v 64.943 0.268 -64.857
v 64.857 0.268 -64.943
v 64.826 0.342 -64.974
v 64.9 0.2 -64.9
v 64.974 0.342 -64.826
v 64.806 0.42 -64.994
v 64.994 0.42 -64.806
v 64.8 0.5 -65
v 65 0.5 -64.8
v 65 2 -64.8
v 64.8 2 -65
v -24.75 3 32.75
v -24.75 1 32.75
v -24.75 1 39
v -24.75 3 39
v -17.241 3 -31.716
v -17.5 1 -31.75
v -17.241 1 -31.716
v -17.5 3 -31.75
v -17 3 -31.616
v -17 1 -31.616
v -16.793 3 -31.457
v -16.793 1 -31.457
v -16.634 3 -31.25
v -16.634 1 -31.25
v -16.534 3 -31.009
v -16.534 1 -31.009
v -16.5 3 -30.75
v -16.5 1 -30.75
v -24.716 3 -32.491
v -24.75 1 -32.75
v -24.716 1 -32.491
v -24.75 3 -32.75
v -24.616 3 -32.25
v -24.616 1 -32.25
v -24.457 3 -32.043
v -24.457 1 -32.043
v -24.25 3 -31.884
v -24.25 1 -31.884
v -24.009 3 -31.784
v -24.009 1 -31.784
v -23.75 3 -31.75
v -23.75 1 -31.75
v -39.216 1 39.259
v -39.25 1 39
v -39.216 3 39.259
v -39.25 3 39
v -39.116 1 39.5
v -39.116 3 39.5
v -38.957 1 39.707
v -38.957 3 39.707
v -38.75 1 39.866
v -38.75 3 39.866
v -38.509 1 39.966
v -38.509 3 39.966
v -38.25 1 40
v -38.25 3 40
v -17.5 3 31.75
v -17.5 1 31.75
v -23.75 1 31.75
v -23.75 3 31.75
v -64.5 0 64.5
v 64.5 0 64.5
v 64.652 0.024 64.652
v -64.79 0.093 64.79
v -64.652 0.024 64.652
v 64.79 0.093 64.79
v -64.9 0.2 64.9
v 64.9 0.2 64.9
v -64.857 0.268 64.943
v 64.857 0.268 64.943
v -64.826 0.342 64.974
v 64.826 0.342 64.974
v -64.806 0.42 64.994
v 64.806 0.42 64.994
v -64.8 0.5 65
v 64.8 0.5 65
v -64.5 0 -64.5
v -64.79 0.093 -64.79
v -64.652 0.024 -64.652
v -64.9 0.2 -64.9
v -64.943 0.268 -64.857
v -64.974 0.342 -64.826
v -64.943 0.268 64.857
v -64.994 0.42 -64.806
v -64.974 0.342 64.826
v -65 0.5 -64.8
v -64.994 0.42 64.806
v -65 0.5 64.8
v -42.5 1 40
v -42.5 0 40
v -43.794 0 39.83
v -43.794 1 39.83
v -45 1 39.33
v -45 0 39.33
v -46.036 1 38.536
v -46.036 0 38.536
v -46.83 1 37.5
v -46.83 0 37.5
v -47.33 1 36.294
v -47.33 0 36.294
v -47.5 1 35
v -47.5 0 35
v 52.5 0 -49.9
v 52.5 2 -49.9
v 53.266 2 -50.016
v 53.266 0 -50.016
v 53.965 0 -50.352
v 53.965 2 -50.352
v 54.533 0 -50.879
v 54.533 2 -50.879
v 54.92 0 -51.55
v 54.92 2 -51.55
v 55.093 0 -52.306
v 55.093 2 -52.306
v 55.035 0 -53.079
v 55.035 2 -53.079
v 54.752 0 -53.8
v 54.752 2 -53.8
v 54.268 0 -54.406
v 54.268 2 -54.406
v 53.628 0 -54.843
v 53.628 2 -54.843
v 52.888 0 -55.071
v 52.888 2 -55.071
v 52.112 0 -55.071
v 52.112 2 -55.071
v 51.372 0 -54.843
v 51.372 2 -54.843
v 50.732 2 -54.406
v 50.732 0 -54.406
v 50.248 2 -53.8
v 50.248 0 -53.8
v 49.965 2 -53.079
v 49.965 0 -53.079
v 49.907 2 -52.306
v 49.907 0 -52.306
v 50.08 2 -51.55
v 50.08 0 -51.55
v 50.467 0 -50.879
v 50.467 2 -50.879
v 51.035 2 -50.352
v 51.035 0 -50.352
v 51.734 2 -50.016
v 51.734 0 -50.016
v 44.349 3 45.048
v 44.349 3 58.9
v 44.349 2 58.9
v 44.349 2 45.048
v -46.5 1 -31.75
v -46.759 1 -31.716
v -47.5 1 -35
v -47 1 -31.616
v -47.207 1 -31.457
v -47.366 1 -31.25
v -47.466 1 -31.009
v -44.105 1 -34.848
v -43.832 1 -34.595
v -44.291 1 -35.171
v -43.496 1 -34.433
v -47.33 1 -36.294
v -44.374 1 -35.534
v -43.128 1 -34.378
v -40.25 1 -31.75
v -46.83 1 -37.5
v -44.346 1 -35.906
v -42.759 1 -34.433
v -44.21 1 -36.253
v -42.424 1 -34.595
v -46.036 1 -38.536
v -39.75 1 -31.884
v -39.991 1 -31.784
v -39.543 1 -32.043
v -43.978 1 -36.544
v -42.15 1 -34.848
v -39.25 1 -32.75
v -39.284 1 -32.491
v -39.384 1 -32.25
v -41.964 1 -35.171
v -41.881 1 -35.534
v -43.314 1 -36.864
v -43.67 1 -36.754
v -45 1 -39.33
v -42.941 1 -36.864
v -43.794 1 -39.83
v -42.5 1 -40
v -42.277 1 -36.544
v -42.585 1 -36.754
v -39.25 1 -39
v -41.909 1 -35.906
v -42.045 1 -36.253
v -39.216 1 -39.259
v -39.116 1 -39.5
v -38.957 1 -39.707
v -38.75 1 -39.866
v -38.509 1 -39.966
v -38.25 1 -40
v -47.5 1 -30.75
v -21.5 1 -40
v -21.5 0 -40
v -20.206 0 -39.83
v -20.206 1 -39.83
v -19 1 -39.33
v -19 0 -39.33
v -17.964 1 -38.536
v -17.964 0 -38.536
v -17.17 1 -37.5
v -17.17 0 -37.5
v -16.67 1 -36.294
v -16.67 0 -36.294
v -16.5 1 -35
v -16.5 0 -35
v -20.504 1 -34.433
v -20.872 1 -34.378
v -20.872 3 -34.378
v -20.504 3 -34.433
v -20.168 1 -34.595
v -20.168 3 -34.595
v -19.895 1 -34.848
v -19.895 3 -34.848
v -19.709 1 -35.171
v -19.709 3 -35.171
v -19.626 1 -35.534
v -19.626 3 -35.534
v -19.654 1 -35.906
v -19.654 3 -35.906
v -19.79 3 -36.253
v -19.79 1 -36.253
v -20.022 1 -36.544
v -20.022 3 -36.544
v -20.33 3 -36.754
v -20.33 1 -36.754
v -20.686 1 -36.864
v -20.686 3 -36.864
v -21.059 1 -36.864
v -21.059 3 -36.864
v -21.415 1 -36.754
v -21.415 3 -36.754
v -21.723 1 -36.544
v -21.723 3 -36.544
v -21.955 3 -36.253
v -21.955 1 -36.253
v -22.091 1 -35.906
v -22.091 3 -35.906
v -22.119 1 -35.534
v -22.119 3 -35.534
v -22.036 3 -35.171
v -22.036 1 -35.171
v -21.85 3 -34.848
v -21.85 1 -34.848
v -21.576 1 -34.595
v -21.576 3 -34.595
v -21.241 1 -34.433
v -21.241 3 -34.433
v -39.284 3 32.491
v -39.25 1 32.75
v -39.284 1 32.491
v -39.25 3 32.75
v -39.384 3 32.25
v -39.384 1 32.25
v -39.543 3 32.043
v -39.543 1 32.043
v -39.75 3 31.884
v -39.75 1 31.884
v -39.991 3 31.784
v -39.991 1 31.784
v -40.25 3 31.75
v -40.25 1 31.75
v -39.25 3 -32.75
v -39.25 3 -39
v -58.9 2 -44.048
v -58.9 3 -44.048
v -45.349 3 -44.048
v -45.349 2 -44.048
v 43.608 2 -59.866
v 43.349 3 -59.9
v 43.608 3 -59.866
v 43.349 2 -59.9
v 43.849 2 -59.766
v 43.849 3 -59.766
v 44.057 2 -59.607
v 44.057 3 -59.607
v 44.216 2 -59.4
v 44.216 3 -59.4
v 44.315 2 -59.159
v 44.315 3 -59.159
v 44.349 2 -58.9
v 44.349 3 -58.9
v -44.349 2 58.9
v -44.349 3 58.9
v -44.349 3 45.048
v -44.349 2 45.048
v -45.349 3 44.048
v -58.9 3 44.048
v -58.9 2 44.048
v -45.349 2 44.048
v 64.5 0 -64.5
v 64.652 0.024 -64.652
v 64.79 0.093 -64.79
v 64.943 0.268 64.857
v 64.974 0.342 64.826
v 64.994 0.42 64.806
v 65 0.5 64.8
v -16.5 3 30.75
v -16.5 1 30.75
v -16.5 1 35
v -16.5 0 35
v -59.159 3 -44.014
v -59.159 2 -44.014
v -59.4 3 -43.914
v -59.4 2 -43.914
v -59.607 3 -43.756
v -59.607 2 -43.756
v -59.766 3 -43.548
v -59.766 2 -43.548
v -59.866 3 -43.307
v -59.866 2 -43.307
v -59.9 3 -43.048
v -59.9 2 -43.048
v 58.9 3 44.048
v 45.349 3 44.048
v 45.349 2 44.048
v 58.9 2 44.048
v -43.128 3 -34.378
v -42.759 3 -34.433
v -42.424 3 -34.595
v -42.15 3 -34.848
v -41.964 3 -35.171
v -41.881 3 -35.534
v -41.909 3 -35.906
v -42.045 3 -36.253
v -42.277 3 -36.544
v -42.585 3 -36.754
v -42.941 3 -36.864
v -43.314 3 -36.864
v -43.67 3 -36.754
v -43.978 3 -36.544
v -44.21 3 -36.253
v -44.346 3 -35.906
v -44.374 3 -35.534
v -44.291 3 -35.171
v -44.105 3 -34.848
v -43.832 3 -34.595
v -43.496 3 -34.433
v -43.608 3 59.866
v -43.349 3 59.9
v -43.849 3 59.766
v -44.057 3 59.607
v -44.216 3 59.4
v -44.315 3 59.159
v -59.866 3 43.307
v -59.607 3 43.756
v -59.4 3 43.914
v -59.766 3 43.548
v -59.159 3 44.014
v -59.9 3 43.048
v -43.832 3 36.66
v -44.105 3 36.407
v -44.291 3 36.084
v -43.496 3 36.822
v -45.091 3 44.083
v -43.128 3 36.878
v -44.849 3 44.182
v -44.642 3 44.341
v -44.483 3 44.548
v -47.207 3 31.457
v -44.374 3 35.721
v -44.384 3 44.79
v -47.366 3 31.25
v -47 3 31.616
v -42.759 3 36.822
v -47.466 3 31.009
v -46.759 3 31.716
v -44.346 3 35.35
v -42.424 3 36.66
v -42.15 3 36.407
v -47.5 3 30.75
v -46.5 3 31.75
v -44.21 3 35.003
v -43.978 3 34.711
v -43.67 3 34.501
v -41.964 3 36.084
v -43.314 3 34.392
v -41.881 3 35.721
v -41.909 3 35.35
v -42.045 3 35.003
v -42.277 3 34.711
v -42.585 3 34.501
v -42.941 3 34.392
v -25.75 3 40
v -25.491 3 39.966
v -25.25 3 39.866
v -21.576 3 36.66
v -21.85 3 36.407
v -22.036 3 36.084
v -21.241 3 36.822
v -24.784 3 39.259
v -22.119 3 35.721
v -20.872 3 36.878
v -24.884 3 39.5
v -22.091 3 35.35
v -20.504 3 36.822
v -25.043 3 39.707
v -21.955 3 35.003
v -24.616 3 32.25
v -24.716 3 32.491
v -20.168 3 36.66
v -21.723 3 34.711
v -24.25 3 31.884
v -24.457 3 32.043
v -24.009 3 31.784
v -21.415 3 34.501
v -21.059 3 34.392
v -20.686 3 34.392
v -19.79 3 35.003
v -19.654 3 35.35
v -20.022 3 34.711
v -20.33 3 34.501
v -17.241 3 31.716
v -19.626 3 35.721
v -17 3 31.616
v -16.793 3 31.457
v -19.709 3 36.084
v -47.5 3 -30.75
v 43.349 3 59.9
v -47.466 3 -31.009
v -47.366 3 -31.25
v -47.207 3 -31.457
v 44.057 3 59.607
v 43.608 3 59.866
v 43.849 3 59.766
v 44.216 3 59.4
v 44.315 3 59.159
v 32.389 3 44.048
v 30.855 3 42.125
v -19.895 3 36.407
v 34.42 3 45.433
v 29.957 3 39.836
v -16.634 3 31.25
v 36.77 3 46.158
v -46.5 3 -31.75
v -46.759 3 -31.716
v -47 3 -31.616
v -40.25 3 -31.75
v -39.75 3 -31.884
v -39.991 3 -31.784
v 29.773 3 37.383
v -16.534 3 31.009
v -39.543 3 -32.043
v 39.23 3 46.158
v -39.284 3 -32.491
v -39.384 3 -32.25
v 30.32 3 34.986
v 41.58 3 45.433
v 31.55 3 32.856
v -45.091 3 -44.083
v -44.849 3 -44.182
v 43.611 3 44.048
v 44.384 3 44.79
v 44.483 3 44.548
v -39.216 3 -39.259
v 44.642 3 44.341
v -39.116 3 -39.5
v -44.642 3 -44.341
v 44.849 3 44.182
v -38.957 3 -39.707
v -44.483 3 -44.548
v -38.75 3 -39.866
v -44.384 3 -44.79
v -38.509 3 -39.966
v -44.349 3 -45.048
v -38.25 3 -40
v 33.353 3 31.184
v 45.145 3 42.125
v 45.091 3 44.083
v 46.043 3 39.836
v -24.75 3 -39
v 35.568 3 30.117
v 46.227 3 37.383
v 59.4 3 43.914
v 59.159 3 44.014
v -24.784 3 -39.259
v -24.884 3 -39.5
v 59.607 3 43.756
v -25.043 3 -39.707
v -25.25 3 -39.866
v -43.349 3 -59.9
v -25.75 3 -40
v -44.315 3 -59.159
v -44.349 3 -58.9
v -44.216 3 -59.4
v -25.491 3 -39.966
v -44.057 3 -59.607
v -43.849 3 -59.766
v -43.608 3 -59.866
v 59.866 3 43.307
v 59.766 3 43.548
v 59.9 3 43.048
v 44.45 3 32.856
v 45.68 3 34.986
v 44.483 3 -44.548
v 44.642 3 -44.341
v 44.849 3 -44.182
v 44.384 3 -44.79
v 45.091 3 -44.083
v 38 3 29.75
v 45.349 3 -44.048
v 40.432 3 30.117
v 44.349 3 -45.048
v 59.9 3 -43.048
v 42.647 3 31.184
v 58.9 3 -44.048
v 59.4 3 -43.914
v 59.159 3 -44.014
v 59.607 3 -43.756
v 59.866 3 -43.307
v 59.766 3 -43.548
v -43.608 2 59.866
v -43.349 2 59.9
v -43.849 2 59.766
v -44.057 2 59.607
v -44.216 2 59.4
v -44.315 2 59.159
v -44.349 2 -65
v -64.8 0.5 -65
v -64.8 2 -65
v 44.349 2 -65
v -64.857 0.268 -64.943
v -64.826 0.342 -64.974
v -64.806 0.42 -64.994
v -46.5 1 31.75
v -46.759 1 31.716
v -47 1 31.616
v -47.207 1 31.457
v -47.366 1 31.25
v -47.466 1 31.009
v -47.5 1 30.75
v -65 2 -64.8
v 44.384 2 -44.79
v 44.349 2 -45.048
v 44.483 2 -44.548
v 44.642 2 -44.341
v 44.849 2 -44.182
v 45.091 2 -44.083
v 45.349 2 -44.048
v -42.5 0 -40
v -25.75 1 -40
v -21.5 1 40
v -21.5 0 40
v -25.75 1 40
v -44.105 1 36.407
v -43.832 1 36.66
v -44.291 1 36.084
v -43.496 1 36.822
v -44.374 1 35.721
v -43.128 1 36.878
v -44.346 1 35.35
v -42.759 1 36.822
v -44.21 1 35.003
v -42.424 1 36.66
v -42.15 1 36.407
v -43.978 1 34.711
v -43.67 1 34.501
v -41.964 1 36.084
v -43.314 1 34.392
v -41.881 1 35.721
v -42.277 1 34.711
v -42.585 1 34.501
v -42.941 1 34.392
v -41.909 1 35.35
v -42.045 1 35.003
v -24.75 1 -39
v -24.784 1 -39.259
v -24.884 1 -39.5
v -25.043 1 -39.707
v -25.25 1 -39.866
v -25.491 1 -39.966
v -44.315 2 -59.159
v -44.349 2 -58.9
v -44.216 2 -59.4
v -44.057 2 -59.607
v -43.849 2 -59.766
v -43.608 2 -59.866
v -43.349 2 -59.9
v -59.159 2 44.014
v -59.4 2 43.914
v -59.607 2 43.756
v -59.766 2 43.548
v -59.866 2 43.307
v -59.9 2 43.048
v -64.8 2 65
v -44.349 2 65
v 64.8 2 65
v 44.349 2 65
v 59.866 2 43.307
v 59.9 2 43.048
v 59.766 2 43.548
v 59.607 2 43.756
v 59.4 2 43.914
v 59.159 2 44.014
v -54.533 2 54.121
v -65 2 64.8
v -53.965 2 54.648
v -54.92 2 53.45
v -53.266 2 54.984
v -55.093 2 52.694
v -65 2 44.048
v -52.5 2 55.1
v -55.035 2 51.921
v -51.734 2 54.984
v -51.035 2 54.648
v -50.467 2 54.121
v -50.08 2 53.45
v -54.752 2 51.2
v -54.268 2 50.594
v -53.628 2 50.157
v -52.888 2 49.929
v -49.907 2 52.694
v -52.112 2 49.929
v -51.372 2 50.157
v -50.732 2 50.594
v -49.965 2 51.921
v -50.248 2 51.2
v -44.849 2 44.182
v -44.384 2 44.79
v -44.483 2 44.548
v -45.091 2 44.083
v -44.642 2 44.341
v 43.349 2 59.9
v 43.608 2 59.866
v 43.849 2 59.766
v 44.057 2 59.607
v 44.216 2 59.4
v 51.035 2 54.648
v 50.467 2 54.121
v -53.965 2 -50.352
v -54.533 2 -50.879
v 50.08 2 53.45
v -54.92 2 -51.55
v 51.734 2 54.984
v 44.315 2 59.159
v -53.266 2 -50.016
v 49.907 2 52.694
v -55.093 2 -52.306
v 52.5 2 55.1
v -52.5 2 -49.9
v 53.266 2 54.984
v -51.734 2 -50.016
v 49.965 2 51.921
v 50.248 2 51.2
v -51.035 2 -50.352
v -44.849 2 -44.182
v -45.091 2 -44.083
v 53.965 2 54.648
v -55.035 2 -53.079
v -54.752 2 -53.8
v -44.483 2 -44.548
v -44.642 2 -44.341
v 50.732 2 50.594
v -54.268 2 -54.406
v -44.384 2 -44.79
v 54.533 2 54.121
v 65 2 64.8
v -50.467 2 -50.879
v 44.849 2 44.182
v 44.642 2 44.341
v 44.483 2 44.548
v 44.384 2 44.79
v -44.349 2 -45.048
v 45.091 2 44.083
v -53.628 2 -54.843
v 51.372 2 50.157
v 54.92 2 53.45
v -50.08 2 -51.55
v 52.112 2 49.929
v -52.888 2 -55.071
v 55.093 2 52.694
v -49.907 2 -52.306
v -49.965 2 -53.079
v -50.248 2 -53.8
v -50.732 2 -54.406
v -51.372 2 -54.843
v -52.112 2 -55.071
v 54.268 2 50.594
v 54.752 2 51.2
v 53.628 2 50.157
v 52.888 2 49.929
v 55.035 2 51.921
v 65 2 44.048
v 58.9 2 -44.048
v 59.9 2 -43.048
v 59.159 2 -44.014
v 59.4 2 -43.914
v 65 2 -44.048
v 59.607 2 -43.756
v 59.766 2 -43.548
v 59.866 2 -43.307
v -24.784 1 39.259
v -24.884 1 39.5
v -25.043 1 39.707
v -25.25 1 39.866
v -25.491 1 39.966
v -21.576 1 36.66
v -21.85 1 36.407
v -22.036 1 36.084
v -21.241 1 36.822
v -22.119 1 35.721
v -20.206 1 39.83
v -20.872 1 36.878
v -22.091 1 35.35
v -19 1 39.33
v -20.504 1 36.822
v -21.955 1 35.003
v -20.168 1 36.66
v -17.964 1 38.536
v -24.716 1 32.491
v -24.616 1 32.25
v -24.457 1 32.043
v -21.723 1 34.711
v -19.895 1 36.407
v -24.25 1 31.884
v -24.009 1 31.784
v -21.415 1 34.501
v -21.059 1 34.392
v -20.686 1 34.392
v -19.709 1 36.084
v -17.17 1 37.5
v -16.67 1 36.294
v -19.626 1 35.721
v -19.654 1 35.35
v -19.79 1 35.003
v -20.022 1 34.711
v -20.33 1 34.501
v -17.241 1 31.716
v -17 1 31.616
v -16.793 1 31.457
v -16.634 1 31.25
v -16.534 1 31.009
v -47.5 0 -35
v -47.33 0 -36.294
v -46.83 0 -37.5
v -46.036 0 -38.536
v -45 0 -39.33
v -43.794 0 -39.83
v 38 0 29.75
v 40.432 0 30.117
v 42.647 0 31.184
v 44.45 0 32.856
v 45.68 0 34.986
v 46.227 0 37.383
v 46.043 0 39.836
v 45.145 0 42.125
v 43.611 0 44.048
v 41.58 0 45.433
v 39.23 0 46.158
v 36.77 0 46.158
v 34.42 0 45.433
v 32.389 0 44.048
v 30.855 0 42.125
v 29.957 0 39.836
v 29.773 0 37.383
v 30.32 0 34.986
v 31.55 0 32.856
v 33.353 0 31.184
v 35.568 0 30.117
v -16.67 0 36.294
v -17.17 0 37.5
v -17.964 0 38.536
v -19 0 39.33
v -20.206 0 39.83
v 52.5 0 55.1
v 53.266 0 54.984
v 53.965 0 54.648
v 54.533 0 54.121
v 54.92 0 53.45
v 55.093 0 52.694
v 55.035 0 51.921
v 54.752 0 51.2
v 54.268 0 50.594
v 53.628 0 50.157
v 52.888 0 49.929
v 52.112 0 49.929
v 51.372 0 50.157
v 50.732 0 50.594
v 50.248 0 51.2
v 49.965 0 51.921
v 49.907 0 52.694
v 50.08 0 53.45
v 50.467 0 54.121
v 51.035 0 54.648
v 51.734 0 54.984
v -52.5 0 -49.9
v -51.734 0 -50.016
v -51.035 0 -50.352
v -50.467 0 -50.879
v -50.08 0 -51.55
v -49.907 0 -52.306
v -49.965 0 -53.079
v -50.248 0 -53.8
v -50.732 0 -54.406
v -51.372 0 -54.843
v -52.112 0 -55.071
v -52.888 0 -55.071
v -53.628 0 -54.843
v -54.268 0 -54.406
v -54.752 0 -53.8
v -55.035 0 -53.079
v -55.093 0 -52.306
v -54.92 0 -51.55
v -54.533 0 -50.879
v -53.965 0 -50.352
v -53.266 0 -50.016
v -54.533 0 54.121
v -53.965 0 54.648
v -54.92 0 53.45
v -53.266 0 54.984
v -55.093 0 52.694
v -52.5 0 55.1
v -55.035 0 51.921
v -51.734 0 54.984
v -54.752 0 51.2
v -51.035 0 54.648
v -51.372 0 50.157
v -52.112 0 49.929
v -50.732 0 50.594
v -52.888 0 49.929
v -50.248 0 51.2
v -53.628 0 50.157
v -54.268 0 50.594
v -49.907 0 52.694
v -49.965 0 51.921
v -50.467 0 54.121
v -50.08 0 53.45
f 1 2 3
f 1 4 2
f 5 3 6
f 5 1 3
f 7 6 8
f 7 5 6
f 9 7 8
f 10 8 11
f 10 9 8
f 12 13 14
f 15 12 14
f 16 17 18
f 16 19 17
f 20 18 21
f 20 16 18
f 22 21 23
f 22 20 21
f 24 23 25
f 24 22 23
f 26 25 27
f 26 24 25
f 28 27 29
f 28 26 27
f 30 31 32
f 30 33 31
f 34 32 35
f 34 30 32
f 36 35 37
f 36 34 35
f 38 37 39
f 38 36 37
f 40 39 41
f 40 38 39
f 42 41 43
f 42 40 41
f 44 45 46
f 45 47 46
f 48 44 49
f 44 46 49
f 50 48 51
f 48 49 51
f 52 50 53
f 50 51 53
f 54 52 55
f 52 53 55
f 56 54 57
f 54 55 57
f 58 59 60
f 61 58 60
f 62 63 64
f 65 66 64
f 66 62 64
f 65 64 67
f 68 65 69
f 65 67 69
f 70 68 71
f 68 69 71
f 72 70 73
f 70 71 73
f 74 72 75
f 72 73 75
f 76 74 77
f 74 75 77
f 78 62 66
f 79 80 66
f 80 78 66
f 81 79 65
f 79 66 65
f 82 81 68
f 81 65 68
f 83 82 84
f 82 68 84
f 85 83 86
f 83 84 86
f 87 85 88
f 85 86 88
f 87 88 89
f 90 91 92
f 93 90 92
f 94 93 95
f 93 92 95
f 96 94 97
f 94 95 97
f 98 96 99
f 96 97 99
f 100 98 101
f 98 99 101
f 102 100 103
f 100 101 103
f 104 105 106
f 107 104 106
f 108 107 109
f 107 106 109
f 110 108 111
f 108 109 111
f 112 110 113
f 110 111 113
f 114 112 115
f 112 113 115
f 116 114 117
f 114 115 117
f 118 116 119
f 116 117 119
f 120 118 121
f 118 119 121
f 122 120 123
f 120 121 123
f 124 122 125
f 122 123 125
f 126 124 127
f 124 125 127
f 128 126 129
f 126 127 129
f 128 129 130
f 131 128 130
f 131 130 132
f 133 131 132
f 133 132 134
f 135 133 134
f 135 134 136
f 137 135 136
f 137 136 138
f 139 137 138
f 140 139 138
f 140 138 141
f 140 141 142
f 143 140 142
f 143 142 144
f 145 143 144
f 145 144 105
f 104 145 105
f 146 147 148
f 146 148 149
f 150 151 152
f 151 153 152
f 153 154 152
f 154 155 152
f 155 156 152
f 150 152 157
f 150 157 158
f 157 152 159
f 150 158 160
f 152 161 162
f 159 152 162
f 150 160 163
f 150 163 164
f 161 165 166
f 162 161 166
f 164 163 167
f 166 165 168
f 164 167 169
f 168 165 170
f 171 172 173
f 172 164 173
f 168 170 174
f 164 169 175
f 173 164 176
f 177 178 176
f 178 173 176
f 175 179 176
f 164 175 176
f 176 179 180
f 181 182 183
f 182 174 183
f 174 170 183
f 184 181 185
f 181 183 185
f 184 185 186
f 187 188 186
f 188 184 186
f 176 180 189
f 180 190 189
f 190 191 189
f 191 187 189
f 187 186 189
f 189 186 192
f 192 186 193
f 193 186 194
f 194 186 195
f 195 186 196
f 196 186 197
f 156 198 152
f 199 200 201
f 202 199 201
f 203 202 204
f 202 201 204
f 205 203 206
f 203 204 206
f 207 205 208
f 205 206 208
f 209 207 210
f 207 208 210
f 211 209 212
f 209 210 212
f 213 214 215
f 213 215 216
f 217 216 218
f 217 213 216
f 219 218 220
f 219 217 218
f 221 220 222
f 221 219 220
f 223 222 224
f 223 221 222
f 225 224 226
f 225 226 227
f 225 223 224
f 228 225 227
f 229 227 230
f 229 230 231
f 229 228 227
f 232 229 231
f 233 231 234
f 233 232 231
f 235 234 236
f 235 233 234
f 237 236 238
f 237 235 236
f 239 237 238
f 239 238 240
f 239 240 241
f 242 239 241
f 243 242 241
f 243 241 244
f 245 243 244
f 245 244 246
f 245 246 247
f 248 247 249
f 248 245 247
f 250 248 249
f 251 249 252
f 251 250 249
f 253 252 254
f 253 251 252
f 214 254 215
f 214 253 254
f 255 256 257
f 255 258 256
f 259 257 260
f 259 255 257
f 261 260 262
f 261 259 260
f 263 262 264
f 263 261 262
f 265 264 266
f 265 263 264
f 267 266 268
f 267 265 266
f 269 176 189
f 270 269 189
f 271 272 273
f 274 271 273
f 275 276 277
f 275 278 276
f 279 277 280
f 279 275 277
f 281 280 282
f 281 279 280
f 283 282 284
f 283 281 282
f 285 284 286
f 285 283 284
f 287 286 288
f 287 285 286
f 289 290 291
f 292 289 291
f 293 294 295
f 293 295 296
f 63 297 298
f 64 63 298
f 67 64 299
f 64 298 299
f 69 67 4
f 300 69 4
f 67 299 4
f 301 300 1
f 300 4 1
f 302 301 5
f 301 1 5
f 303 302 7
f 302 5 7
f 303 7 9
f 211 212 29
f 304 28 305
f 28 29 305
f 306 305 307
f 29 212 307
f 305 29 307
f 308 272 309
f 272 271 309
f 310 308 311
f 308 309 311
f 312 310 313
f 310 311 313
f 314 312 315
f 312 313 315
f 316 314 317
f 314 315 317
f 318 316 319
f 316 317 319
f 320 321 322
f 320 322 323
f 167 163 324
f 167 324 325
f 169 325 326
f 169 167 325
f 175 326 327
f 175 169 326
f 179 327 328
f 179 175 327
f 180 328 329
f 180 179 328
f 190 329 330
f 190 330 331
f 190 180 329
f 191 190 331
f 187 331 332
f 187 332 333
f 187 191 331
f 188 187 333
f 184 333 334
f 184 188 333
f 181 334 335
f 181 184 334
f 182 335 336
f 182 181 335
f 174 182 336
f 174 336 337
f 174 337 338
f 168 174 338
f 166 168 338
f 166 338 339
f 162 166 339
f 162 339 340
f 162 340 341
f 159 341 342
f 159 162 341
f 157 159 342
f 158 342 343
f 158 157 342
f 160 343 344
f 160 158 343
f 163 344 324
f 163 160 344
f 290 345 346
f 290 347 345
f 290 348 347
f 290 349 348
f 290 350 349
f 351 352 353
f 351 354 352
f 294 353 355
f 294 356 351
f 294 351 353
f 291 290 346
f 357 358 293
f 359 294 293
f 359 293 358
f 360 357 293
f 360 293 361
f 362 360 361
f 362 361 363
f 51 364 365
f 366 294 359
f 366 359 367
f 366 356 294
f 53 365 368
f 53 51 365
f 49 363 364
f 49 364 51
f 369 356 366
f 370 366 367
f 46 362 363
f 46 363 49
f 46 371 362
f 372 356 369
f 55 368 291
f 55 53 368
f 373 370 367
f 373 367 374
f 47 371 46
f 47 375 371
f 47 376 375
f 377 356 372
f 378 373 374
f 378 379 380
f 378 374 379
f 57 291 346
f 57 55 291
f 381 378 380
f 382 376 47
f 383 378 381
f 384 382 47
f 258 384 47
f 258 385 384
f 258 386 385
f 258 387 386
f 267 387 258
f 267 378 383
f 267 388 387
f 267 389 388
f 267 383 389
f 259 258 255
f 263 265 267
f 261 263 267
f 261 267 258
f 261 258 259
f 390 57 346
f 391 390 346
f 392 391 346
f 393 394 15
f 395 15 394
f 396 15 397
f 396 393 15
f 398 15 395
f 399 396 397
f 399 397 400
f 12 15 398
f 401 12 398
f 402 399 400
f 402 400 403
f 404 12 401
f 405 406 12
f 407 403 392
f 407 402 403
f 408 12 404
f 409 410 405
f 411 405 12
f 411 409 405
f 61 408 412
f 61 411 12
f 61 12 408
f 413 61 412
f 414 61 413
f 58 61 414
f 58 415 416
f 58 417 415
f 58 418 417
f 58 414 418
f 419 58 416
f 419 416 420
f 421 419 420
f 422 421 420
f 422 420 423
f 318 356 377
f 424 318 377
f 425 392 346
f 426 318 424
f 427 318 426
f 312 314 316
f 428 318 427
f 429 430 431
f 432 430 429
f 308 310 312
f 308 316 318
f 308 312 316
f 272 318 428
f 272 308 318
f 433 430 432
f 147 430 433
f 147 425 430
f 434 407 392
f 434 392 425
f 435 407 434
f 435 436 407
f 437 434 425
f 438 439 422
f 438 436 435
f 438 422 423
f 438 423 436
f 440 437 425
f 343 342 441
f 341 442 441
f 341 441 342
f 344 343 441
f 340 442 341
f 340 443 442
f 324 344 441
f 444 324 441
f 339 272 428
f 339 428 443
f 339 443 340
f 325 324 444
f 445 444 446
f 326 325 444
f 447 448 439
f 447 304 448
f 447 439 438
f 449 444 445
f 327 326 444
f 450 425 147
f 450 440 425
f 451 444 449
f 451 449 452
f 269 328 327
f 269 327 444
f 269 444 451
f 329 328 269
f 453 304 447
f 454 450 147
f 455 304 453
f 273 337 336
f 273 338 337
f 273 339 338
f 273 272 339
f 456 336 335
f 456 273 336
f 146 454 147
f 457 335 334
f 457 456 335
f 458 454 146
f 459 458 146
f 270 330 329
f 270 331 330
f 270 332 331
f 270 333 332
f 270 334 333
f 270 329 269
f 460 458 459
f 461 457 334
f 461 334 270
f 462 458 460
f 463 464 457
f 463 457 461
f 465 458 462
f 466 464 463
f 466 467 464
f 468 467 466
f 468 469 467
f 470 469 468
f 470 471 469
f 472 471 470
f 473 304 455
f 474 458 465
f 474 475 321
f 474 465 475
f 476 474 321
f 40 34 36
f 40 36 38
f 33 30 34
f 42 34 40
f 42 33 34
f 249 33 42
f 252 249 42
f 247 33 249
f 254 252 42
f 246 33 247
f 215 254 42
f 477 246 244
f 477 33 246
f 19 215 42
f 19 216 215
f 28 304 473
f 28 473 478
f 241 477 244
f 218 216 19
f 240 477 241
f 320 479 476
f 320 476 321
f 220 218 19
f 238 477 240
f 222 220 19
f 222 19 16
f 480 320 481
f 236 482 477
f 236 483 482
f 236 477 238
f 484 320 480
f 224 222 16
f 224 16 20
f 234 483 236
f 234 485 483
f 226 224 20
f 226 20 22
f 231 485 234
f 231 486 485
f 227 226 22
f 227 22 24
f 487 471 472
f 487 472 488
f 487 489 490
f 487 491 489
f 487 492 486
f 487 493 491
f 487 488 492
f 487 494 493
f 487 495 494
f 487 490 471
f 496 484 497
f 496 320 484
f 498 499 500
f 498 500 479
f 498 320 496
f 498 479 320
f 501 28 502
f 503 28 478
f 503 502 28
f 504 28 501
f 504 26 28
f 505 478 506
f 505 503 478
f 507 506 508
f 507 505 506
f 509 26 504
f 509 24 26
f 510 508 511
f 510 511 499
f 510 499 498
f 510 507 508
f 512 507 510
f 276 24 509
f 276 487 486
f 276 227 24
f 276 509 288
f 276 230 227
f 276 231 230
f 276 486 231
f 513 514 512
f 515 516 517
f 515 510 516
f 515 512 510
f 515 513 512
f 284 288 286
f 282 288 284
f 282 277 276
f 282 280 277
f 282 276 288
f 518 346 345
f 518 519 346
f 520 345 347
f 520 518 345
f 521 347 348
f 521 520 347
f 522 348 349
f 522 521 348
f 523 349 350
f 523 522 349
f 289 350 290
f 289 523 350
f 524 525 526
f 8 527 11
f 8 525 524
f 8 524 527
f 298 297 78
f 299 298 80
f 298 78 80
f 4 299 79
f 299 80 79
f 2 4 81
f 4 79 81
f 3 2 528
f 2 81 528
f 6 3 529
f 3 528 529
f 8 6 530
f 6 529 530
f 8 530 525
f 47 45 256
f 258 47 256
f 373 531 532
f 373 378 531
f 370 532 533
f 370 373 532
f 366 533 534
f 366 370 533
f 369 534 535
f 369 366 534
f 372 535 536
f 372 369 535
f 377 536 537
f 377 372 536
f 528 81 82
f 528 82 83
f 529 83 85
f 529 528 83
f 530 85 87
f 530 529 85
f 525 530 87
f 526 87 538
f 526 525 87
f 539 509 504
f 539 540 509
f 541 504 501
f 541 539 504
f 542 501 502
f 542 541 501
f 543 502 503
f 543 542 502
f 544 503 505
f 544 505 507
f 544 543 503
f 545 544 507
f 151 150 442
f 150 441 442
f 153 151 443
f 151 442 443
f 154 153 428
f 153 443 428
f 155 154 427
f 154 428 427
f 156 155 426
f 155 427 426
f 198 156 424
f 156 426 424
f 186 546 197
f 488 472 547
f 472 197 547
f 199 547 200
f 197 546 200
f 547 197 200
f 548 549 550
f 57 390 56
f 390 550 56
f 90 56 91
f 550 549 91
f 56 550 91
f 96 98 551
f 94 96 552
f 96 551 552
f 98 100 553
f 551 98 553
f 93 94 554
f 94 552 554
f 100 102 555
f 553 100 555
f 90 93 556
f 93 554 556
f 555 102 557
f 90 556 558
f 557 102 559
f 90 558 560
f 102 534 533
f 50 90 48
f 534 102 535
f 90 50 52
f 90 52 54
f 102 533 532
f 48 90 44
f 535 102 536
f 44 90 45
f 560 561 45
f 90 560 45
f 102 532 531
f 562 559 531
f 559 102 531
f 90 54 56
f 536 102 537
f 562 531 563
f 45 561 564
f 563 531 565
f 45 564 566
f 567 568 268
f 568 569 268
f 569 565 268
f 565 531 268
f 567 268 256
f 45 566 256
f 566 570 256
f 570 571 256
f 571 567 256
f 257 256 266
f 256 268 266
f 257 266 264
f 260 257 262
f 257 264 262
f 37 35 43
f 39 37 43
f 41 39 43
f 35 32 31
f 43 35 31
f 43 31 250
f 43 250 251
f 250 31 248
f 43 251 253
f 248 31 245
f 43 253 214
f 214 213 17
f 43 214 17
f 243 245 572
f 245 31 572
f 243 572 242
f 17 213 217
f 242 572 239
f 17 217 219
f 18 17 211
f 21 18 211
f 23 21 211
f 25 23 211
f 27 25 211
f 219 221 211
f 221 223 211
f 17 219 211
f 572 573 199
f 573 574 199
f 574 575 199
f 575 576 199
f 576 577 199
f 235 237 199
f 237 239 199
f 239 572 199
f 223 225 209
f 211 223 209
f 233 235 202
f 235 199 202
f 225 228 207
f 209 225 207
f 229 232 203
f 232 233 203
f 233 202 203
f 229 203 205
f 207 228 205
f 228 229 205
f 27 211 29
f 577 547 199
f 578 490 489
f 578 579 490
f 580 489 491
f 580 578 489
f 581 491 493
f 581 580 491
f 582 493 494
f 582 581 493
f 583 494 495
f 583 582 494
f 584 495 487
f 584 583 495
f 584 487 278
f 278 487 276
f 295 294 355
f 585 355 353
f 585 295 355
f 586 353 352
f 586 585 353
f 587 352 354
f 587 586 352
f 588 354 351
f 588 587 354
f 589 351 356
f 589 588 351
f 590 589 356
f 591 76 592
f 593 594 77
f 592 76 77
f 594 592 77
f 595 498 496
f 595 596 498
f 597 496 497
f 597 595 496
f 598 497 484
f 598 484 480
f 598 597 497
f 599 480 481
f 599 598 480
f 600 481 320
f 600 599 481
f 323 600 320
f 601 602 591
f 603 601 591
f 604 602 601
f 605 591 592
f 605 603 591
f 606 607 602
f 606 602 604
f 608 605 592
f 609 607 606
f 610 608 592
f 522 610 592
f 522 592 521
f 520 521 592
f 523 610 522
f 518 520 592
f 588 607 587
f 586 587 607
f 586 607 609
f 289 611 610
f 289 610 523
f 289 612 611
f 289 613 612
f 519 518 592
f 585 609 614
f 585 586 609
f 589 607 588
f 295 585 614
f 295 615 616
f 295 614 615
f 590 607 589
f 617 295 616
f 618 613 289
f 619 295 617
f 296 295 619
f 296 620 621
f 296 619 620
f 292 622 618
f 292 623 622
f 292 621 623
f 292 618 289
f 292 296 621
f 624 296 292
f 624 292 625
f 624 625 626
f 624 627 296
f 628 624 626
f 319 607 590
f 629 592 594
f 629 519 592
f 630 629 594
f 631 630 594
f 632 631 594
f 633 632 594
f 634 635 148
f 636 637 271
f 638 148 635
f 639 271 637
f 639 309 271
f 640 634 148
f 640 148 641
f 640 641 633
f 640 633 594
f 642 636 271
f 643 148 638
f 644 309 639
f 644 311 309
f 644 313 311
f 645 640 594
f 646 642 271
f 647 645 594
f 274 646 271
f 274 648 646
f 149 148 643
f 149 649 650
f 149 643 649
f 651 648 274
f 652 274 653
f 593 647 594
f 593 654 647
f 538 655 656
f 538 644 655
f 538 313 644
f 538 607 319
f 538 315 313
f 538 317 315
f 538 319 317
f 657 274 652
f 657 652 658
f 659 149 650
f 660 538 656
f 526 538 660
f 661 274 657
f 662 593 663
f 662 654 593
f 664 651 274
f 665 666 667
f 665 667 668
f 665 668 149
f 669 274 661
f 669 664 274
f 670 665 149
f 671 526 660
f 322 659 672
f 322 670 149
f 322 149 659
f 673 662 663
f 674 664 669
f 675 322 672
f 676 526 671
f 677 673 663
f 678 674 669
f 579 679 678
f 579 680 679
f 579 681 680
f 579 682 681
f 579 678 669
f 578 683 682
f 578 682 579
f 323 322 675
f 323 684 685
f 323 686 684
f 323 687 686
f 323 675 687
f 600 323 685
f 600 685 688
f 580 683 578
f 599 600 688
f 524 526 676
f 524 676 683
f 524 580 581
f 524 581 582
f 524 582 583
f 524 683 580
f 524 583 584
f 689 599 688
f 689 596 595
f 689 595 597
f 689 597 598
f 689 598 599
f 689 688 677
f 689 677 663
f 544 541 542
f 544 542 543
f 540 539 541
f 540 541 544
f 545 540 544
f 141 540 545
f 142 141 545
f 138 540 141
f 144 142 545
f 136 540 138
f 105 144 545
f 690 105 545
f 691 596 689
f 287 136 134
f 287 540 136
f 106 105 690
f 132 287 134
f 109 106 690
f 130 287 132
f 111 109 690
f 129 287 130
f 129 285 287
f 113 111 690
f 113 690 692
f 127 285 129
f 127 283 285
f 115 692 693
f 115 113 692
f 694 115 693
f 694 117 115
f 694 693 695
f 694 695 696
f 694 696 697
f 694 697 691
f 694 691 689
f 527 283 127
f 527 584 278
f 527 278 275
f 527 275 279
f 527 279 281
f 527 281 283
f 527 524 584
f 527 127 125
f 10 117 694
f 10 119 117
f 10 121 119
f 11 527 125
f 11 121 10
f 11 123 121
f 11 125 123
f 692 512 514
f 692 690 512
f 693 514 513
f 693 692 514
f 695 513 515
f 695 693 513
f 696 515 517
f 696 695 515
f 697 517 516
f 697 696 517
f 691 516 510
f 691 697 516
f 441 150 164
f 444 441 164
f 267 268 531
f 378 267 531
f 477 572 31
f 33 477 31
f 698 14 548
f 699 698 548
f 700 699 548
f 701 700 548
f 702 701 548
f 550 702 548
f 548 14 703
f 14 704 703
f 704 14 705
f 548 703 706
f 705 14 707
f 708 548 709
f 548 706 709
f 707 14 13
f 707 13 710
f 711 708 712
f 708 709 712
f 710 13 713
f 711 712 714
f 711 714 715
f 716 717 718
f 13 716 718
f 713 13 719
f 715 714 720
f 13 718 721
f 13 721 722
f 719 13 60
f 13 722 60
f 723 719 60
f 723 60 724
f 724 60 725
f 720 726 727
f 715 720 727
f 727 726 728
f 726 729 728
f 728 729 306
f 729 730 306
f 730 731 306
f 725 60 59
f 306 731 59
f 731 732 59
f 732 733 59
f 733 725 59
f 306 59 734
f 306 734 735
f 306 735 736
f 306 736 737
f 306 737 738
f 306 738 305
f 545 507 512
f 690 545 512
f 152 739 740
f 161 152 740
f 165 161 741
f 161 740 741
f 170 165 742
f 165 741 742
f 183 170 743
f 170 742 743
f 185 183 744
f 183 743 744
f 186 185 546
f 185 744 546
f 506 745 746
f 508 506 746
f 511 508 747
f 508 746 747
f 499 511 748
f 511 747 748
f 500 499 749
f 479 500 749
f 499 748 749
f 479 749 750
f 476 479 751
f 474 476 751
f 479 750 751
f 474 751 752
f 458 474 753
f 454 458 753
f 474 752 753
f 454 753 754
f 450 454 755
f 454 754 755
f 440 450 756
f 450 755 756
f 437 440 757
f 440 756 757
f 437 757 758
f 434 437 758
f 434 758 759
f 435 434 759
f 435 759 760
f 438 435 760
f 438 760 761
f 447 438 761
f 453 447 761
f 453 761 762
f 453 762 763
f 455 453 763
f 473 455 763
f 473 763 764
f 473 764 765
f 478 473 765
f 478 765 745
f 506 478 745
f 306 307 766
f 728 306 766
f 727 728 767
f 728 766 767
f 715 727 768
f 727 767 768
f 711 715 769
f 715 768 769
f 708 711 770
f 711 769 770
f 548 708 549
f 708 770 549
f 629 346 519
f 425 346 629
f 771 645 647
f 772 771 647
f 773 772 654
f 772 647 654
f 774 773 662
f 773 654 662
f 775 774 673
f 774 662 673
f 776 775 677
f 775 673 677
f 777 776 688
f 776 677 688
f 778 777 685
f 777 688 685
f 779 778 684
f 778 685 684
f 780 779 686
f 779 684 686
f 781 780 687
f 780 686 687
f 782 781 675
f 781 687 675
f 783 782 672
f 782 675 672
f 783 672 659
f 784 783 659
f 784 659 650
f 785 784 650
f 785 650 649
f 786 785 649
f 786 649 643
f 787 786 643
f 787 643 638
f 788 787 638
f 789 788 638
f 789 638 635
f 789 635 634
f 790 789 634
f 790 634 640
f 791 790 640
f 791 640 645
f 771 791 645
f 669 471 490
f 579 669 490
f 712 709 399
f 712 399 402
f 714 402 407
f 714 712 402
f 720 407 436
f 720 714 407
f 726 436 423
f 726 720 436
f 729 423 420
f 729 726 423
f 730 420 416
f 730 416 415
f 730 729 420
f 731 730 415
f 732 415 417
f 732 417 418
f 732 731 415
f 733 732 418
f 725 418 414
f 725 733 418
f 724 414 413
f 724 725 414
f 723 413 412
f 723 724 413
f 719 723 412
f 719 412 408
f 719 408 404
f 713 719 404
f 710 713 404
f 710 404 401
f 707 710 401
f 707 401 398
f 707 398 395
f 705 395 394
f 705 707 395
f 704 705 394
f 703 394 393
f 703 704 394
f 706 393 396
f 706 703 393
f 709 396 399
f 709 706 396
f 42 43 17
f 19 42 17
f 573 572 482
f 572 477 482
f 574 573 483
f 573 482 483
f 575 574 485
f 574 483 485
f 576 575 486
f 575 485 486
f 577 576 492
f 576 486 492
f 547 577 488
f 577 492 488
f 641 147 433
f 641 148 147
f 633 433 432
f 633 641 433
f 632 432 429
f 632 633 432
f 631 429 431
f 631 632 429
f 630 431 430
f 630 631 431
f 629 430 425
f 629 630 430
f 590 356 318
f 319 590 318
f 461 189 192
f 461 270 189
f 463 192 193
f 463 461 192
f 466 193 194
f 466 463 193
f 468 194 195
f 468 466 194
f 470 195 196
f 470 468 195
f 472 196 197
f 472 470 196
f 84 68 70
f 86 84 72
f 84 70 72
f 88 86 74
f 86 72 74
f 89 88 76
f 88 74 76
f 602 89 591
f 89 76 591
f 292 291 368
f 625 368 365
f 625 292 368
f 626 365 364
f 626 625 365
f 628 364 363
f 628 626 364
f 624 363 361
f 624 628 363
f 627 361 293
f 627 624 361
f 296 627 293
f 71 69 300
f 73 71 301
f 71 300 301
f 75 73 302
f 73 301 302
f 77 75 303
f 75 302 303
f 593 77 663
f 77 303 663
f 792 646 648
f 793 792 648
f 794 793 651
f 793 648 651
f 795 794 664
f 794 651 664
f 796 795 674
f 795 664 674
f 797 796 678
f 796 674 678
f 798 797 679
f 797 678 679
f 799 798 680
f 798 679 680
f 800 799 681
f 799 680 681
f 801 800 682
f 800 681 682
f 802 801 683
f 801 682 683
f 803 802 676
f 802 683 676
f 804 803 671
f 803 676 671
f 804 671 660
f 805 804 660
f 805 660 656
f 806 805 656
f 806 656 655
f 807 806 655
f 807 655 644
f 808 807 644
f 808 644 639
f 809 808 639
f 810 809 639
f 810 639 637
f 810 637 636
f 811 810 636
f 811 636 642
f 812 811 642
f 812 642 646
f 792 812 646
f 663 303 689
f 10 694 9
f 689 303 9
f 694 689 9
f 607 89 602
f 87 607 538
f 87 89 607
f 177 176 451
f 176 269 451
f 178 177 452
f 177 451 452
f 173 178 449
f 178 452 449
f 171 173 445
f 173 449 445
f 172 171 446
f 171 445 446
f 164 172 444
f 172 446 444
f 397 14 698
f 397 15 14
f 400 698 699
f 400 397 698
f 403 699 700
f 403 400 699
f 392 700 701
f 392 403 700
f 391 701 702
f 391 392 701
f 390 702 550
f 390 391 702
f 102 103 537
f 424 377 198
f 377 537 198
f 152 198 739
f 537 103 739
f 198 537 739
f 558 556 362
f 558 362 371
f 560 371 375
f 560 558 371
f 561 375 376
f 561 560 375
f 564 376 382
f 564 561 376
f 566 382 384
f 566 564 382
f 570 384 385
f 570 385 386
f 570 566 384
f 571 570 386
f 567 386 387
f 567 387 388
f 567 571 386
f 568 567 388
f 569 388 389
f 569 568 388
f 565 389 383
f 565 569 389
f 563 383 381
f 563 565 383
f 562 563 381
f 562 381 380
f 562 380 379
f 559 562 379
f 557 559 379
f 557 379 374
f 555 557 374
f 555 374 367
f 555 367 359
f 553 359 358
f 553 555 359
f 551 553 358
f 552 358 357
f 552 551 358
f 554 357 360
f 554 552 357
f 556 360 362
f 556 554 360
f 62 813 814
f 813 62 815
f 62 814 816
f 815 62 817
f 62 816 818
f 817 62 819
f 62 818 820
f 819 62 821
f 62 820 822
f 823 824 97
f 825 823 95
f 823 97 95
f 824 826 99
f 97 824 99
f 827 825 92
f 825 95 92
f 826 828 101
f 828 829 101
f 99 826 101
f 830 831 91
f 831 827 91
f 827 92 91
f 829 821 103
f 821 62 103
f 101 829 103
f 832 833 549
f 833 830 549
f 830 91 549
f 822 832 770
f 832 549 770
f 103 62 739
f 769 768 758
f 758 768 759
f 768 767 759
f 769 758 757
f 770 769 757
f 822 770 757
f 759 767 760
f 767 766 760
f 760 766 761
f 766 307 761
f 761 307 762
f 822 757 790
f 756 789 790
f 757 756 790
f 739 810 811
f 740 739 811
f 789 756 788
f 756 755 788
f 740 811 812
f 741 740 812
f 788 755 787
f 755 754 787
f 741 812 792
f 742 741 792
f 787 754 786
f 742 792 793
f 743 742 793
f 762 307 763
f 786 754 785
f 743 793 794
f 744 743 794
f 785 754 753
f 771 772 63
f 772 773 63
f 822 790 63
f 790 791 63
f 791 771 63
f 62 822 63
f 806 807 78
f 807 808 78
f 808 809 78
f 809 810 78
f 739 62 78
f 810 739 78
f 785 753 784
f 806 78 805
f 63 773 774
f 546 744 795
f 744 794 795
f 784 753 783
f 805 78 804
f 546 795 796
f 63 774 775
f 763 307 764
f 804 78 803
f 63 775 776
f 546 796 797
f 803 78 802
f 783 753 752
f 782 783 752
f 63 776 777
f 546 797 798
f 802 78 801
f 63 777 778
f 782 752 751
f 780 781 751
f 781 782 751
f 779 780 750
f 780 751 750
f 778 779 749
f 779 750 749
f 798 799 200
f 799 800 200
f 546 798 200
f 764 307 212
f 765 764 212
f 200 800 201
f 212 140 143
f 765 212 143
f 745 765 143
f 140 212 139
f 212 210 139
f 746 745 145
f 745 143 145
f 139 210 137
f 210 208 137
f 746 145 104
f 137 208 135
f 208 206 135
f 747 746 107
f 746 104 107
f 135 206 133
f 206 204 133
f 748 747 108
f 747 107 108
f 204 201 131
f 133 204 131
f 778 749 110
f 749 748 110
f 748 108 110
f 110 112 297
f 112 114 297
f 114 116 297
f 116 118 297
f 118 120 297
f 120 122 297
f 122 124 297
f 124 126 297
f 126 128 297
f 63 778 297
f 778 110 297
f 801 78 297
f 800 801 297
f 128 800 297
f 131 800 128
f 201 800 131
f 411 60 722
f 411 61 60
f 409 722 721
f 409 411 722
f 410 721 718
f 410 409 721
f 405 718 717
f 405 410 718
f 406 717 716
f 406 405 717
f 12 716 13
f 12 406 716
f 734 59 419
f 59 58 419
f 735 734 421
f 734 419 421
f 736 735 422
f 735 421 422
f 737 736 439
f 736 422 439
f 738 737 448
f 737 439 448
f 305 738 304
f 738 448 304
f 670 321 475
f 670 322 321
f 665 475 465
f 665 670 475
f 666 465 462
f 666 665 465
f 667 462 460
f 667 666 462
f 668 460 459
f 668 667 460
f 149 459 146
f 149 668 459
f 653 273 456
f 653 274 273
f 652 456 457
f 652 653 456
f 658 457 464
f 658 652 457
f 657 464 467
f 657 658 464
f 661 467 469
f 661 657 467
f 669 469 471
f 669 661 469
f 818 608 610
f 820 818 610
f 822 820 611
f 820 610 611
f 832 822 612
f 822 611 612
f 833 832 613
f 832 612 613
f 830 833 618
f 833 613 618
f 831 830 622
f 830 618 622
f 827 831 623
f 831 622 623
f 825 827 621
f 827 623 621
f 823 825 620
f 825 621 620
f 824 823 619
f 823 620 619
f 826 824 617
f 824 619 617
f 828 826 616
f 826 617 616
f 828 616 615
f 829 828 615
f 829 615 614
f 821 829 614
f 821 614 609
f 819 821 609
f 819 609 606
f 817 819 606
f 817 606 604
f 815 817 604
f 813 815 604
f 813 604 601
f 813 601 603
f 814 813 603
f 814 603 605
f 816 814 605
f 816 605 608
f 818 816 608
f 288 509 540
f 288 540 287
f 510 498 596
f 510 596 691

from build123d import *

# Parameters (mm, degrees)
SKETCH_1_W          = 130
SKETCH_1_H          = 130
EXTRUDE_1_DEPTH     = 3
SKETCH_2_R          = 2.6
CUT_EXTRUDE_1_DEPTH = 92.972822073
SKETCH_4_W          = 20.650518397
SKETCH_4_H          = 20.951555191
CUT_EXTRUDE_2_DEPTH = 1
SKETCH_5_W          = 88.698963206
SKETCH_5_H          = 5.1
SKETCH_5_W_2        = 5.1
SKETCH_5_H_2        = 88.096889618
CUT_EXTRUDE_3_DEPTH = 1
CUT_EXTRUDE_4_DEPTH = 3
EXTRUDE_START       = -2
SKETCH_7_R          = 1.25
EXTRUDE_2_DEPTH     = 2
FILLET_1_R          = 1
SKETCH_15_R         = 8.25
CUT_EXTRUDE_9_DEPTH = 92.972822073
CHAMFER_2_SIZE      = 0.2
FILLET_2_R          = 0.5
FILLET_3_R          = 1
FILLET_4_R          = 1


with BuildPart() as part:
    # 草图1 → 凸台-拉伸1 (new body)
    with BuildSketch(Plane(origin=(0, 0, 0), x_dir=(1, 0, 0), z_dir=(0, 1, 0))):
        Rectangle(SKETCH_1_W, SKETCH_1_H)
    extrude(amount=EXTRUDE_1_DEPTH)

    # 草图2 → 切除-拉伸1 (cut, through all)
    with BuildSketch(Plane(origin=(0, 3, 0), x_dir=(1, 0, 0), z_dir=(0, 1, 0))):
        with Locations(Location((52.5, 52.5, 0), (0, 0, 270))):
            Circle(SKETCH_2_R)
        with Locations(Location((52.5, -52.5, 0), (0, 0, 270))):
            Circle(SKETCH_2_R)
        with Locations(Location((-52.5, -52.5, 0), (0, 0, 270))):
            Circle(SKETCH_2_R)
        with Locations(Location((-52.5, 52.5, 0), (0, 0, 270))):
            Circle(SKETCH_2_R)
    extrude(amount=-CUT_EXTRUDE_1_DEPTH, mode=Mode.SUBTRACT)

    # 草图4 → 切除-拉伸2 (cut)
    with BuildSketch(Plane(origin=(0, 3, 0), x_dir=(1, 0, 0), z_dir=(0, 1, 0))):
        with Locations((54.674740802, 54.524222405)):
            Rectangle(SKETCH_4_W, SKETCH_4_H)
        with Locations((-54.674740802, -54.524222405)):
            Rectangle(SKETCH_4_W, SKETCH_4_H)
        with Locations((54.674740802, -54.524222405)):
            Rectangle(SKETCH_4_W, SKETCH_4_H)
        with Locations((-54.674740802, 54.524222405)):
            Rectangle(SKETCH_4_W, SKETCH_4_H)
    extrude(amount=-CUT_EXTRUDE_2_DEPTH, mode=Mode.SUBTRACT)

    # 草图5 → 切除-拉伸3 (cut)
    with BuildSketch(Plane(origin=(0, 3, 0), x_dir=(1, 0, 0), z_dir=(0, 1, 0))):
        with Locations((0, 62.45)):
            Rectangle(SKETCH_5_W, SKETCH_5_H)
        with Locations((62.45, 0)):
            Rectangle(SKETCH_5_W_2, SKETCH_5_H_2)
        with Locations((0, -62.45)):
            Rectangle(SKETCH_5_W, SKETCH_5_H)
        with Locations((-62.45, 0)):
            Rectangle(SKETCH_5_W_2, SKETCH_5_H_2)
    extrude(amount=-CUT_EXTRUDE_3_DEPTH, mode=Mode.SUBTRACT)

    # 草图6 → 切除-拉伸4 (cut)
    with BuildSketch(Plane(origin=(0, 0, 0), x_dir=(-1, 0, 0), z_dir=(0, -1, 0))):
        with BuildLine():
            Line((47.5, -35), (47.5, 35))
            ThreePointArc((47.5, 35), (46.035533906, 38.535533906), (42.5, 40))
            Line((42.5, 40), (21.5, 40))
            ThreePointArc((21.5, 40), (17.964466094, 38.535533906), (16.5, 35))
            Line((16.5, 35), (16.5, -35))
            ThreePointArc((16.5, -35), (17.964466094, -38.535533906), (21.5, -40))
            Line((21.5, -40), (42.5, -40))
            ThreePointArc((42.5, -40), (46.035533906, -38.535533906), (47.5, -35))
        make_face()
    extrude(amount=-CUT_EXTRUDE_4_DEPTH, mode=Mode.SUBTRACT)

    # 草图7 → 凸台-拉伸2 (add)
    # profile 1 of 4: a face of its own
    with BuildSketch(Plane(origin=(0, 3, 0), x_dir=(1, 0, 0), z_dir=(0, 1, 0)).offset(EXTRUDE_START)):
        with BuildLine():
            Line((-24.75, 40), (-24.75, 31.75))
            Line((-24.75, 31.75), (-16.5, 31.75))
            Line((-16.5, 31.75), (-16.5, 35))
            ThreePointArc((-16.5, 35), (-17.964466094, 38.535533906), (-21.5, 40))
            Line((-21.5, 40), (-24.75, 40))
        make_face()
        with Locations(Location((-20.872307757, 35.627692243, 0), (0, 0, 270))):
            Circle(SKETCH_7_R, mode=Mode.SUBTRACT)
    # profile 2 of 4: a face of its own
    with BuildSketch(Plane(origin=(0, 3, 0), x_dir=(1, 0, 0), z_dir=(0, 1, 0)).offset(EXTRUDE_START)):
        with BuildLine():
            Line((-16.5, -31.75), (-24.75, -31.75))
            Line((-24.75, -31.75), (-24.75, -40))
            Line((-24.75, -40), (-21.5, -40))
            ThreePointArc((-21.5, -40), (-17.964466094, -38.535533906), (-16.5, -35))
            Line((-16.5, -35), (-16.5, -31.75))
        make_face()
        with Locations(Location((-20.872307757, -35.627692243, 0), (0, 0, 270))):
            Circle(SKETCH_7_R, mode=Mode.SUBTRACT)
    # profile 3 of 4: a face of its own
    with BuildSketch(Plane(origin=(0, 3, 0), x_dir=(1, 0, 0), z_dir=(0, 1, 0)).offset(EXTRUDE_START)):
        with BuildLine():
            Line((-39.25, -40), (-39.25, -31.75))
            Line((-39.25, -31.75), (-47.5, -31.75))
            Line((-47.5, -31.75), (-47.5, -35))
            ThreePointArc((-47.5, -35), (-46.035533906, -38.535533906), (-42.5, -40))
            Line((-42.5, -40), (-39.25, -40))
        make_face()
        with Locations(Location((-43.127692243, -35.627692243, 0), (0, 0, 270))):
            Circle(SKETCH_7_R, mode=Mode.SUBTRACT)
    # profile 4 of 4: a face of its own
    with BuildSketch(Plane(origin=(0, 3, 0), x_dir=(1, 0, 0), z_dir=(0, 1, 0)).offset(EXTRUDE_START)):
        with BuildLine():
            Line((-47.5, 31.75), (-39.25, 31.75))
            Line((-39.25, 31.75), (-39.25, 40))
            Line((-39.25, 40), (-42.5, 40))
            ThreePointArc((-42.5, 40), (-46.035533906, 38.535533906), (-47.5, 35))
            Line((-47.5, 35), (-47.5, 31.75))
        make_face()
        with Locations(Location((-43.127692243, 35.627692243, 0), (0, 0, 270))):
            Circle(SKETCH_7_R, mode=Mode.SUBTRACT)
    extrude(amount=EXTRUDE_2_DEPTH)

    # 圆角1
    fillet_1_edges = [part.edges().sort_by_distance(p)[0] for p in [
        (-24.75, 2, -31.75),
        (-39.25, 2, -31.75),
        (-39.25, 2, 31.75),
        (-24.75, 2, 31.75),
    ]]
    fillet(fillet_1_edges, radius=FILLET_1_R)

    # 草图15 → 切除-拉伸9 (cut, through all)
    with BuildSketch(Plane(origin=(0, 0, 0), x_dir=(-1, 0, 0), z_dir=(0, -1, 0))):
        with Locations(Location((-38, -38, 0), (0, 0, 90))):
            Circle(SKETCH_15_R)
    extrude(amount=-CUT_EXTRUDE_9_DEPTH, mode=Mode.SUBTRACT)

    # 倒角2
    chamfer_2_edges = [part.edges().sort_by_distance(p)[0] for p in [
        (65, 1, 65),
        (-65, 1, 65),
        (-65, 1, -65),
        (65, 1, -65),
    ]]
    chamfer(chamfer_2_edges, length=CHAMFER_2_SIZE)

    # 圆角2
    # the kernel refuses this fillet: 0.5 mm, written as the material it takes off along each edge
    with BuildSketch(Plane(origin=(-66.05, 0, -65), x_dir=(0, 0, 1), z_dir=(1, 0, 0)), Plane(origin=(-65, 0, 66.05), x_dir=(1, 0, 0), z_dir=(0, 0, -1)), Plane(origin=(66.05, 0, 65), x_dir=(0, 0, -1), z_dir=(-1, 0, 0)), Plane(origin=(65, 0, -66.05), x_dir=(-1, 0, 0), z_dir=(0, 0, 1))) as fillet_2_piece_1:
        with BuildLine():
            CenterArc((FILLET_2_R, -FILLET_2_R), FILLET_2_R, 90, 90)
            Line((0, -FILLET_2_R), (0, 0))
            Line((0, 0), (FILLET_2_R, 0))
        make_face()
    extrude(amount=132.1, mode=Mode.SUBTRACT)

    # 圆角3
    fillet_3_edges = [part.edges().sort_by_distance(p)[0] for p in [
        (59.9, 2.5, 44.048444809),
        (59.9, 2.5, -44.048444809),
        (-44.349481603, 2.5, -59.9),
        (44.349481603, 2.5, -59.9),
        (44.349481603, 2.5, 59.9),
        (-44.349481603, 2.5, 59.9),
        (-59.9, 2.5, 44.048444809),
        (-59.9, 2.5, -44.048444809),
        (-44.349481603, 2.5, -44.048444809),
        (-44.349481603, 2.5, 44.048444809),
        (44.349481603, 2.5, 44.048444809),
        (44.349481603, 2.5, -44.048444809),
    ]]
    fillet(fillet_3_edges, radius=FILLET_3_R)

    # 圆角4
    fillet_4_edges = [part.edges().sort_by_distance(p)[0] for p in [
        (-24.75, 2, -40),
        (-16.5, 2, -31.75),
        (-47.5, 2, -31.75),
        (-39.25, 2, -40),
        (-39.25, 2, 40),
        (-47.5, 2, 31.75),
        (-16.5, 2, 31.75),
        (-24.75, 2, 40),
    ]]
    fillet(fillet_4_edges, radius=FILLET_4_R)


solid = part.part
